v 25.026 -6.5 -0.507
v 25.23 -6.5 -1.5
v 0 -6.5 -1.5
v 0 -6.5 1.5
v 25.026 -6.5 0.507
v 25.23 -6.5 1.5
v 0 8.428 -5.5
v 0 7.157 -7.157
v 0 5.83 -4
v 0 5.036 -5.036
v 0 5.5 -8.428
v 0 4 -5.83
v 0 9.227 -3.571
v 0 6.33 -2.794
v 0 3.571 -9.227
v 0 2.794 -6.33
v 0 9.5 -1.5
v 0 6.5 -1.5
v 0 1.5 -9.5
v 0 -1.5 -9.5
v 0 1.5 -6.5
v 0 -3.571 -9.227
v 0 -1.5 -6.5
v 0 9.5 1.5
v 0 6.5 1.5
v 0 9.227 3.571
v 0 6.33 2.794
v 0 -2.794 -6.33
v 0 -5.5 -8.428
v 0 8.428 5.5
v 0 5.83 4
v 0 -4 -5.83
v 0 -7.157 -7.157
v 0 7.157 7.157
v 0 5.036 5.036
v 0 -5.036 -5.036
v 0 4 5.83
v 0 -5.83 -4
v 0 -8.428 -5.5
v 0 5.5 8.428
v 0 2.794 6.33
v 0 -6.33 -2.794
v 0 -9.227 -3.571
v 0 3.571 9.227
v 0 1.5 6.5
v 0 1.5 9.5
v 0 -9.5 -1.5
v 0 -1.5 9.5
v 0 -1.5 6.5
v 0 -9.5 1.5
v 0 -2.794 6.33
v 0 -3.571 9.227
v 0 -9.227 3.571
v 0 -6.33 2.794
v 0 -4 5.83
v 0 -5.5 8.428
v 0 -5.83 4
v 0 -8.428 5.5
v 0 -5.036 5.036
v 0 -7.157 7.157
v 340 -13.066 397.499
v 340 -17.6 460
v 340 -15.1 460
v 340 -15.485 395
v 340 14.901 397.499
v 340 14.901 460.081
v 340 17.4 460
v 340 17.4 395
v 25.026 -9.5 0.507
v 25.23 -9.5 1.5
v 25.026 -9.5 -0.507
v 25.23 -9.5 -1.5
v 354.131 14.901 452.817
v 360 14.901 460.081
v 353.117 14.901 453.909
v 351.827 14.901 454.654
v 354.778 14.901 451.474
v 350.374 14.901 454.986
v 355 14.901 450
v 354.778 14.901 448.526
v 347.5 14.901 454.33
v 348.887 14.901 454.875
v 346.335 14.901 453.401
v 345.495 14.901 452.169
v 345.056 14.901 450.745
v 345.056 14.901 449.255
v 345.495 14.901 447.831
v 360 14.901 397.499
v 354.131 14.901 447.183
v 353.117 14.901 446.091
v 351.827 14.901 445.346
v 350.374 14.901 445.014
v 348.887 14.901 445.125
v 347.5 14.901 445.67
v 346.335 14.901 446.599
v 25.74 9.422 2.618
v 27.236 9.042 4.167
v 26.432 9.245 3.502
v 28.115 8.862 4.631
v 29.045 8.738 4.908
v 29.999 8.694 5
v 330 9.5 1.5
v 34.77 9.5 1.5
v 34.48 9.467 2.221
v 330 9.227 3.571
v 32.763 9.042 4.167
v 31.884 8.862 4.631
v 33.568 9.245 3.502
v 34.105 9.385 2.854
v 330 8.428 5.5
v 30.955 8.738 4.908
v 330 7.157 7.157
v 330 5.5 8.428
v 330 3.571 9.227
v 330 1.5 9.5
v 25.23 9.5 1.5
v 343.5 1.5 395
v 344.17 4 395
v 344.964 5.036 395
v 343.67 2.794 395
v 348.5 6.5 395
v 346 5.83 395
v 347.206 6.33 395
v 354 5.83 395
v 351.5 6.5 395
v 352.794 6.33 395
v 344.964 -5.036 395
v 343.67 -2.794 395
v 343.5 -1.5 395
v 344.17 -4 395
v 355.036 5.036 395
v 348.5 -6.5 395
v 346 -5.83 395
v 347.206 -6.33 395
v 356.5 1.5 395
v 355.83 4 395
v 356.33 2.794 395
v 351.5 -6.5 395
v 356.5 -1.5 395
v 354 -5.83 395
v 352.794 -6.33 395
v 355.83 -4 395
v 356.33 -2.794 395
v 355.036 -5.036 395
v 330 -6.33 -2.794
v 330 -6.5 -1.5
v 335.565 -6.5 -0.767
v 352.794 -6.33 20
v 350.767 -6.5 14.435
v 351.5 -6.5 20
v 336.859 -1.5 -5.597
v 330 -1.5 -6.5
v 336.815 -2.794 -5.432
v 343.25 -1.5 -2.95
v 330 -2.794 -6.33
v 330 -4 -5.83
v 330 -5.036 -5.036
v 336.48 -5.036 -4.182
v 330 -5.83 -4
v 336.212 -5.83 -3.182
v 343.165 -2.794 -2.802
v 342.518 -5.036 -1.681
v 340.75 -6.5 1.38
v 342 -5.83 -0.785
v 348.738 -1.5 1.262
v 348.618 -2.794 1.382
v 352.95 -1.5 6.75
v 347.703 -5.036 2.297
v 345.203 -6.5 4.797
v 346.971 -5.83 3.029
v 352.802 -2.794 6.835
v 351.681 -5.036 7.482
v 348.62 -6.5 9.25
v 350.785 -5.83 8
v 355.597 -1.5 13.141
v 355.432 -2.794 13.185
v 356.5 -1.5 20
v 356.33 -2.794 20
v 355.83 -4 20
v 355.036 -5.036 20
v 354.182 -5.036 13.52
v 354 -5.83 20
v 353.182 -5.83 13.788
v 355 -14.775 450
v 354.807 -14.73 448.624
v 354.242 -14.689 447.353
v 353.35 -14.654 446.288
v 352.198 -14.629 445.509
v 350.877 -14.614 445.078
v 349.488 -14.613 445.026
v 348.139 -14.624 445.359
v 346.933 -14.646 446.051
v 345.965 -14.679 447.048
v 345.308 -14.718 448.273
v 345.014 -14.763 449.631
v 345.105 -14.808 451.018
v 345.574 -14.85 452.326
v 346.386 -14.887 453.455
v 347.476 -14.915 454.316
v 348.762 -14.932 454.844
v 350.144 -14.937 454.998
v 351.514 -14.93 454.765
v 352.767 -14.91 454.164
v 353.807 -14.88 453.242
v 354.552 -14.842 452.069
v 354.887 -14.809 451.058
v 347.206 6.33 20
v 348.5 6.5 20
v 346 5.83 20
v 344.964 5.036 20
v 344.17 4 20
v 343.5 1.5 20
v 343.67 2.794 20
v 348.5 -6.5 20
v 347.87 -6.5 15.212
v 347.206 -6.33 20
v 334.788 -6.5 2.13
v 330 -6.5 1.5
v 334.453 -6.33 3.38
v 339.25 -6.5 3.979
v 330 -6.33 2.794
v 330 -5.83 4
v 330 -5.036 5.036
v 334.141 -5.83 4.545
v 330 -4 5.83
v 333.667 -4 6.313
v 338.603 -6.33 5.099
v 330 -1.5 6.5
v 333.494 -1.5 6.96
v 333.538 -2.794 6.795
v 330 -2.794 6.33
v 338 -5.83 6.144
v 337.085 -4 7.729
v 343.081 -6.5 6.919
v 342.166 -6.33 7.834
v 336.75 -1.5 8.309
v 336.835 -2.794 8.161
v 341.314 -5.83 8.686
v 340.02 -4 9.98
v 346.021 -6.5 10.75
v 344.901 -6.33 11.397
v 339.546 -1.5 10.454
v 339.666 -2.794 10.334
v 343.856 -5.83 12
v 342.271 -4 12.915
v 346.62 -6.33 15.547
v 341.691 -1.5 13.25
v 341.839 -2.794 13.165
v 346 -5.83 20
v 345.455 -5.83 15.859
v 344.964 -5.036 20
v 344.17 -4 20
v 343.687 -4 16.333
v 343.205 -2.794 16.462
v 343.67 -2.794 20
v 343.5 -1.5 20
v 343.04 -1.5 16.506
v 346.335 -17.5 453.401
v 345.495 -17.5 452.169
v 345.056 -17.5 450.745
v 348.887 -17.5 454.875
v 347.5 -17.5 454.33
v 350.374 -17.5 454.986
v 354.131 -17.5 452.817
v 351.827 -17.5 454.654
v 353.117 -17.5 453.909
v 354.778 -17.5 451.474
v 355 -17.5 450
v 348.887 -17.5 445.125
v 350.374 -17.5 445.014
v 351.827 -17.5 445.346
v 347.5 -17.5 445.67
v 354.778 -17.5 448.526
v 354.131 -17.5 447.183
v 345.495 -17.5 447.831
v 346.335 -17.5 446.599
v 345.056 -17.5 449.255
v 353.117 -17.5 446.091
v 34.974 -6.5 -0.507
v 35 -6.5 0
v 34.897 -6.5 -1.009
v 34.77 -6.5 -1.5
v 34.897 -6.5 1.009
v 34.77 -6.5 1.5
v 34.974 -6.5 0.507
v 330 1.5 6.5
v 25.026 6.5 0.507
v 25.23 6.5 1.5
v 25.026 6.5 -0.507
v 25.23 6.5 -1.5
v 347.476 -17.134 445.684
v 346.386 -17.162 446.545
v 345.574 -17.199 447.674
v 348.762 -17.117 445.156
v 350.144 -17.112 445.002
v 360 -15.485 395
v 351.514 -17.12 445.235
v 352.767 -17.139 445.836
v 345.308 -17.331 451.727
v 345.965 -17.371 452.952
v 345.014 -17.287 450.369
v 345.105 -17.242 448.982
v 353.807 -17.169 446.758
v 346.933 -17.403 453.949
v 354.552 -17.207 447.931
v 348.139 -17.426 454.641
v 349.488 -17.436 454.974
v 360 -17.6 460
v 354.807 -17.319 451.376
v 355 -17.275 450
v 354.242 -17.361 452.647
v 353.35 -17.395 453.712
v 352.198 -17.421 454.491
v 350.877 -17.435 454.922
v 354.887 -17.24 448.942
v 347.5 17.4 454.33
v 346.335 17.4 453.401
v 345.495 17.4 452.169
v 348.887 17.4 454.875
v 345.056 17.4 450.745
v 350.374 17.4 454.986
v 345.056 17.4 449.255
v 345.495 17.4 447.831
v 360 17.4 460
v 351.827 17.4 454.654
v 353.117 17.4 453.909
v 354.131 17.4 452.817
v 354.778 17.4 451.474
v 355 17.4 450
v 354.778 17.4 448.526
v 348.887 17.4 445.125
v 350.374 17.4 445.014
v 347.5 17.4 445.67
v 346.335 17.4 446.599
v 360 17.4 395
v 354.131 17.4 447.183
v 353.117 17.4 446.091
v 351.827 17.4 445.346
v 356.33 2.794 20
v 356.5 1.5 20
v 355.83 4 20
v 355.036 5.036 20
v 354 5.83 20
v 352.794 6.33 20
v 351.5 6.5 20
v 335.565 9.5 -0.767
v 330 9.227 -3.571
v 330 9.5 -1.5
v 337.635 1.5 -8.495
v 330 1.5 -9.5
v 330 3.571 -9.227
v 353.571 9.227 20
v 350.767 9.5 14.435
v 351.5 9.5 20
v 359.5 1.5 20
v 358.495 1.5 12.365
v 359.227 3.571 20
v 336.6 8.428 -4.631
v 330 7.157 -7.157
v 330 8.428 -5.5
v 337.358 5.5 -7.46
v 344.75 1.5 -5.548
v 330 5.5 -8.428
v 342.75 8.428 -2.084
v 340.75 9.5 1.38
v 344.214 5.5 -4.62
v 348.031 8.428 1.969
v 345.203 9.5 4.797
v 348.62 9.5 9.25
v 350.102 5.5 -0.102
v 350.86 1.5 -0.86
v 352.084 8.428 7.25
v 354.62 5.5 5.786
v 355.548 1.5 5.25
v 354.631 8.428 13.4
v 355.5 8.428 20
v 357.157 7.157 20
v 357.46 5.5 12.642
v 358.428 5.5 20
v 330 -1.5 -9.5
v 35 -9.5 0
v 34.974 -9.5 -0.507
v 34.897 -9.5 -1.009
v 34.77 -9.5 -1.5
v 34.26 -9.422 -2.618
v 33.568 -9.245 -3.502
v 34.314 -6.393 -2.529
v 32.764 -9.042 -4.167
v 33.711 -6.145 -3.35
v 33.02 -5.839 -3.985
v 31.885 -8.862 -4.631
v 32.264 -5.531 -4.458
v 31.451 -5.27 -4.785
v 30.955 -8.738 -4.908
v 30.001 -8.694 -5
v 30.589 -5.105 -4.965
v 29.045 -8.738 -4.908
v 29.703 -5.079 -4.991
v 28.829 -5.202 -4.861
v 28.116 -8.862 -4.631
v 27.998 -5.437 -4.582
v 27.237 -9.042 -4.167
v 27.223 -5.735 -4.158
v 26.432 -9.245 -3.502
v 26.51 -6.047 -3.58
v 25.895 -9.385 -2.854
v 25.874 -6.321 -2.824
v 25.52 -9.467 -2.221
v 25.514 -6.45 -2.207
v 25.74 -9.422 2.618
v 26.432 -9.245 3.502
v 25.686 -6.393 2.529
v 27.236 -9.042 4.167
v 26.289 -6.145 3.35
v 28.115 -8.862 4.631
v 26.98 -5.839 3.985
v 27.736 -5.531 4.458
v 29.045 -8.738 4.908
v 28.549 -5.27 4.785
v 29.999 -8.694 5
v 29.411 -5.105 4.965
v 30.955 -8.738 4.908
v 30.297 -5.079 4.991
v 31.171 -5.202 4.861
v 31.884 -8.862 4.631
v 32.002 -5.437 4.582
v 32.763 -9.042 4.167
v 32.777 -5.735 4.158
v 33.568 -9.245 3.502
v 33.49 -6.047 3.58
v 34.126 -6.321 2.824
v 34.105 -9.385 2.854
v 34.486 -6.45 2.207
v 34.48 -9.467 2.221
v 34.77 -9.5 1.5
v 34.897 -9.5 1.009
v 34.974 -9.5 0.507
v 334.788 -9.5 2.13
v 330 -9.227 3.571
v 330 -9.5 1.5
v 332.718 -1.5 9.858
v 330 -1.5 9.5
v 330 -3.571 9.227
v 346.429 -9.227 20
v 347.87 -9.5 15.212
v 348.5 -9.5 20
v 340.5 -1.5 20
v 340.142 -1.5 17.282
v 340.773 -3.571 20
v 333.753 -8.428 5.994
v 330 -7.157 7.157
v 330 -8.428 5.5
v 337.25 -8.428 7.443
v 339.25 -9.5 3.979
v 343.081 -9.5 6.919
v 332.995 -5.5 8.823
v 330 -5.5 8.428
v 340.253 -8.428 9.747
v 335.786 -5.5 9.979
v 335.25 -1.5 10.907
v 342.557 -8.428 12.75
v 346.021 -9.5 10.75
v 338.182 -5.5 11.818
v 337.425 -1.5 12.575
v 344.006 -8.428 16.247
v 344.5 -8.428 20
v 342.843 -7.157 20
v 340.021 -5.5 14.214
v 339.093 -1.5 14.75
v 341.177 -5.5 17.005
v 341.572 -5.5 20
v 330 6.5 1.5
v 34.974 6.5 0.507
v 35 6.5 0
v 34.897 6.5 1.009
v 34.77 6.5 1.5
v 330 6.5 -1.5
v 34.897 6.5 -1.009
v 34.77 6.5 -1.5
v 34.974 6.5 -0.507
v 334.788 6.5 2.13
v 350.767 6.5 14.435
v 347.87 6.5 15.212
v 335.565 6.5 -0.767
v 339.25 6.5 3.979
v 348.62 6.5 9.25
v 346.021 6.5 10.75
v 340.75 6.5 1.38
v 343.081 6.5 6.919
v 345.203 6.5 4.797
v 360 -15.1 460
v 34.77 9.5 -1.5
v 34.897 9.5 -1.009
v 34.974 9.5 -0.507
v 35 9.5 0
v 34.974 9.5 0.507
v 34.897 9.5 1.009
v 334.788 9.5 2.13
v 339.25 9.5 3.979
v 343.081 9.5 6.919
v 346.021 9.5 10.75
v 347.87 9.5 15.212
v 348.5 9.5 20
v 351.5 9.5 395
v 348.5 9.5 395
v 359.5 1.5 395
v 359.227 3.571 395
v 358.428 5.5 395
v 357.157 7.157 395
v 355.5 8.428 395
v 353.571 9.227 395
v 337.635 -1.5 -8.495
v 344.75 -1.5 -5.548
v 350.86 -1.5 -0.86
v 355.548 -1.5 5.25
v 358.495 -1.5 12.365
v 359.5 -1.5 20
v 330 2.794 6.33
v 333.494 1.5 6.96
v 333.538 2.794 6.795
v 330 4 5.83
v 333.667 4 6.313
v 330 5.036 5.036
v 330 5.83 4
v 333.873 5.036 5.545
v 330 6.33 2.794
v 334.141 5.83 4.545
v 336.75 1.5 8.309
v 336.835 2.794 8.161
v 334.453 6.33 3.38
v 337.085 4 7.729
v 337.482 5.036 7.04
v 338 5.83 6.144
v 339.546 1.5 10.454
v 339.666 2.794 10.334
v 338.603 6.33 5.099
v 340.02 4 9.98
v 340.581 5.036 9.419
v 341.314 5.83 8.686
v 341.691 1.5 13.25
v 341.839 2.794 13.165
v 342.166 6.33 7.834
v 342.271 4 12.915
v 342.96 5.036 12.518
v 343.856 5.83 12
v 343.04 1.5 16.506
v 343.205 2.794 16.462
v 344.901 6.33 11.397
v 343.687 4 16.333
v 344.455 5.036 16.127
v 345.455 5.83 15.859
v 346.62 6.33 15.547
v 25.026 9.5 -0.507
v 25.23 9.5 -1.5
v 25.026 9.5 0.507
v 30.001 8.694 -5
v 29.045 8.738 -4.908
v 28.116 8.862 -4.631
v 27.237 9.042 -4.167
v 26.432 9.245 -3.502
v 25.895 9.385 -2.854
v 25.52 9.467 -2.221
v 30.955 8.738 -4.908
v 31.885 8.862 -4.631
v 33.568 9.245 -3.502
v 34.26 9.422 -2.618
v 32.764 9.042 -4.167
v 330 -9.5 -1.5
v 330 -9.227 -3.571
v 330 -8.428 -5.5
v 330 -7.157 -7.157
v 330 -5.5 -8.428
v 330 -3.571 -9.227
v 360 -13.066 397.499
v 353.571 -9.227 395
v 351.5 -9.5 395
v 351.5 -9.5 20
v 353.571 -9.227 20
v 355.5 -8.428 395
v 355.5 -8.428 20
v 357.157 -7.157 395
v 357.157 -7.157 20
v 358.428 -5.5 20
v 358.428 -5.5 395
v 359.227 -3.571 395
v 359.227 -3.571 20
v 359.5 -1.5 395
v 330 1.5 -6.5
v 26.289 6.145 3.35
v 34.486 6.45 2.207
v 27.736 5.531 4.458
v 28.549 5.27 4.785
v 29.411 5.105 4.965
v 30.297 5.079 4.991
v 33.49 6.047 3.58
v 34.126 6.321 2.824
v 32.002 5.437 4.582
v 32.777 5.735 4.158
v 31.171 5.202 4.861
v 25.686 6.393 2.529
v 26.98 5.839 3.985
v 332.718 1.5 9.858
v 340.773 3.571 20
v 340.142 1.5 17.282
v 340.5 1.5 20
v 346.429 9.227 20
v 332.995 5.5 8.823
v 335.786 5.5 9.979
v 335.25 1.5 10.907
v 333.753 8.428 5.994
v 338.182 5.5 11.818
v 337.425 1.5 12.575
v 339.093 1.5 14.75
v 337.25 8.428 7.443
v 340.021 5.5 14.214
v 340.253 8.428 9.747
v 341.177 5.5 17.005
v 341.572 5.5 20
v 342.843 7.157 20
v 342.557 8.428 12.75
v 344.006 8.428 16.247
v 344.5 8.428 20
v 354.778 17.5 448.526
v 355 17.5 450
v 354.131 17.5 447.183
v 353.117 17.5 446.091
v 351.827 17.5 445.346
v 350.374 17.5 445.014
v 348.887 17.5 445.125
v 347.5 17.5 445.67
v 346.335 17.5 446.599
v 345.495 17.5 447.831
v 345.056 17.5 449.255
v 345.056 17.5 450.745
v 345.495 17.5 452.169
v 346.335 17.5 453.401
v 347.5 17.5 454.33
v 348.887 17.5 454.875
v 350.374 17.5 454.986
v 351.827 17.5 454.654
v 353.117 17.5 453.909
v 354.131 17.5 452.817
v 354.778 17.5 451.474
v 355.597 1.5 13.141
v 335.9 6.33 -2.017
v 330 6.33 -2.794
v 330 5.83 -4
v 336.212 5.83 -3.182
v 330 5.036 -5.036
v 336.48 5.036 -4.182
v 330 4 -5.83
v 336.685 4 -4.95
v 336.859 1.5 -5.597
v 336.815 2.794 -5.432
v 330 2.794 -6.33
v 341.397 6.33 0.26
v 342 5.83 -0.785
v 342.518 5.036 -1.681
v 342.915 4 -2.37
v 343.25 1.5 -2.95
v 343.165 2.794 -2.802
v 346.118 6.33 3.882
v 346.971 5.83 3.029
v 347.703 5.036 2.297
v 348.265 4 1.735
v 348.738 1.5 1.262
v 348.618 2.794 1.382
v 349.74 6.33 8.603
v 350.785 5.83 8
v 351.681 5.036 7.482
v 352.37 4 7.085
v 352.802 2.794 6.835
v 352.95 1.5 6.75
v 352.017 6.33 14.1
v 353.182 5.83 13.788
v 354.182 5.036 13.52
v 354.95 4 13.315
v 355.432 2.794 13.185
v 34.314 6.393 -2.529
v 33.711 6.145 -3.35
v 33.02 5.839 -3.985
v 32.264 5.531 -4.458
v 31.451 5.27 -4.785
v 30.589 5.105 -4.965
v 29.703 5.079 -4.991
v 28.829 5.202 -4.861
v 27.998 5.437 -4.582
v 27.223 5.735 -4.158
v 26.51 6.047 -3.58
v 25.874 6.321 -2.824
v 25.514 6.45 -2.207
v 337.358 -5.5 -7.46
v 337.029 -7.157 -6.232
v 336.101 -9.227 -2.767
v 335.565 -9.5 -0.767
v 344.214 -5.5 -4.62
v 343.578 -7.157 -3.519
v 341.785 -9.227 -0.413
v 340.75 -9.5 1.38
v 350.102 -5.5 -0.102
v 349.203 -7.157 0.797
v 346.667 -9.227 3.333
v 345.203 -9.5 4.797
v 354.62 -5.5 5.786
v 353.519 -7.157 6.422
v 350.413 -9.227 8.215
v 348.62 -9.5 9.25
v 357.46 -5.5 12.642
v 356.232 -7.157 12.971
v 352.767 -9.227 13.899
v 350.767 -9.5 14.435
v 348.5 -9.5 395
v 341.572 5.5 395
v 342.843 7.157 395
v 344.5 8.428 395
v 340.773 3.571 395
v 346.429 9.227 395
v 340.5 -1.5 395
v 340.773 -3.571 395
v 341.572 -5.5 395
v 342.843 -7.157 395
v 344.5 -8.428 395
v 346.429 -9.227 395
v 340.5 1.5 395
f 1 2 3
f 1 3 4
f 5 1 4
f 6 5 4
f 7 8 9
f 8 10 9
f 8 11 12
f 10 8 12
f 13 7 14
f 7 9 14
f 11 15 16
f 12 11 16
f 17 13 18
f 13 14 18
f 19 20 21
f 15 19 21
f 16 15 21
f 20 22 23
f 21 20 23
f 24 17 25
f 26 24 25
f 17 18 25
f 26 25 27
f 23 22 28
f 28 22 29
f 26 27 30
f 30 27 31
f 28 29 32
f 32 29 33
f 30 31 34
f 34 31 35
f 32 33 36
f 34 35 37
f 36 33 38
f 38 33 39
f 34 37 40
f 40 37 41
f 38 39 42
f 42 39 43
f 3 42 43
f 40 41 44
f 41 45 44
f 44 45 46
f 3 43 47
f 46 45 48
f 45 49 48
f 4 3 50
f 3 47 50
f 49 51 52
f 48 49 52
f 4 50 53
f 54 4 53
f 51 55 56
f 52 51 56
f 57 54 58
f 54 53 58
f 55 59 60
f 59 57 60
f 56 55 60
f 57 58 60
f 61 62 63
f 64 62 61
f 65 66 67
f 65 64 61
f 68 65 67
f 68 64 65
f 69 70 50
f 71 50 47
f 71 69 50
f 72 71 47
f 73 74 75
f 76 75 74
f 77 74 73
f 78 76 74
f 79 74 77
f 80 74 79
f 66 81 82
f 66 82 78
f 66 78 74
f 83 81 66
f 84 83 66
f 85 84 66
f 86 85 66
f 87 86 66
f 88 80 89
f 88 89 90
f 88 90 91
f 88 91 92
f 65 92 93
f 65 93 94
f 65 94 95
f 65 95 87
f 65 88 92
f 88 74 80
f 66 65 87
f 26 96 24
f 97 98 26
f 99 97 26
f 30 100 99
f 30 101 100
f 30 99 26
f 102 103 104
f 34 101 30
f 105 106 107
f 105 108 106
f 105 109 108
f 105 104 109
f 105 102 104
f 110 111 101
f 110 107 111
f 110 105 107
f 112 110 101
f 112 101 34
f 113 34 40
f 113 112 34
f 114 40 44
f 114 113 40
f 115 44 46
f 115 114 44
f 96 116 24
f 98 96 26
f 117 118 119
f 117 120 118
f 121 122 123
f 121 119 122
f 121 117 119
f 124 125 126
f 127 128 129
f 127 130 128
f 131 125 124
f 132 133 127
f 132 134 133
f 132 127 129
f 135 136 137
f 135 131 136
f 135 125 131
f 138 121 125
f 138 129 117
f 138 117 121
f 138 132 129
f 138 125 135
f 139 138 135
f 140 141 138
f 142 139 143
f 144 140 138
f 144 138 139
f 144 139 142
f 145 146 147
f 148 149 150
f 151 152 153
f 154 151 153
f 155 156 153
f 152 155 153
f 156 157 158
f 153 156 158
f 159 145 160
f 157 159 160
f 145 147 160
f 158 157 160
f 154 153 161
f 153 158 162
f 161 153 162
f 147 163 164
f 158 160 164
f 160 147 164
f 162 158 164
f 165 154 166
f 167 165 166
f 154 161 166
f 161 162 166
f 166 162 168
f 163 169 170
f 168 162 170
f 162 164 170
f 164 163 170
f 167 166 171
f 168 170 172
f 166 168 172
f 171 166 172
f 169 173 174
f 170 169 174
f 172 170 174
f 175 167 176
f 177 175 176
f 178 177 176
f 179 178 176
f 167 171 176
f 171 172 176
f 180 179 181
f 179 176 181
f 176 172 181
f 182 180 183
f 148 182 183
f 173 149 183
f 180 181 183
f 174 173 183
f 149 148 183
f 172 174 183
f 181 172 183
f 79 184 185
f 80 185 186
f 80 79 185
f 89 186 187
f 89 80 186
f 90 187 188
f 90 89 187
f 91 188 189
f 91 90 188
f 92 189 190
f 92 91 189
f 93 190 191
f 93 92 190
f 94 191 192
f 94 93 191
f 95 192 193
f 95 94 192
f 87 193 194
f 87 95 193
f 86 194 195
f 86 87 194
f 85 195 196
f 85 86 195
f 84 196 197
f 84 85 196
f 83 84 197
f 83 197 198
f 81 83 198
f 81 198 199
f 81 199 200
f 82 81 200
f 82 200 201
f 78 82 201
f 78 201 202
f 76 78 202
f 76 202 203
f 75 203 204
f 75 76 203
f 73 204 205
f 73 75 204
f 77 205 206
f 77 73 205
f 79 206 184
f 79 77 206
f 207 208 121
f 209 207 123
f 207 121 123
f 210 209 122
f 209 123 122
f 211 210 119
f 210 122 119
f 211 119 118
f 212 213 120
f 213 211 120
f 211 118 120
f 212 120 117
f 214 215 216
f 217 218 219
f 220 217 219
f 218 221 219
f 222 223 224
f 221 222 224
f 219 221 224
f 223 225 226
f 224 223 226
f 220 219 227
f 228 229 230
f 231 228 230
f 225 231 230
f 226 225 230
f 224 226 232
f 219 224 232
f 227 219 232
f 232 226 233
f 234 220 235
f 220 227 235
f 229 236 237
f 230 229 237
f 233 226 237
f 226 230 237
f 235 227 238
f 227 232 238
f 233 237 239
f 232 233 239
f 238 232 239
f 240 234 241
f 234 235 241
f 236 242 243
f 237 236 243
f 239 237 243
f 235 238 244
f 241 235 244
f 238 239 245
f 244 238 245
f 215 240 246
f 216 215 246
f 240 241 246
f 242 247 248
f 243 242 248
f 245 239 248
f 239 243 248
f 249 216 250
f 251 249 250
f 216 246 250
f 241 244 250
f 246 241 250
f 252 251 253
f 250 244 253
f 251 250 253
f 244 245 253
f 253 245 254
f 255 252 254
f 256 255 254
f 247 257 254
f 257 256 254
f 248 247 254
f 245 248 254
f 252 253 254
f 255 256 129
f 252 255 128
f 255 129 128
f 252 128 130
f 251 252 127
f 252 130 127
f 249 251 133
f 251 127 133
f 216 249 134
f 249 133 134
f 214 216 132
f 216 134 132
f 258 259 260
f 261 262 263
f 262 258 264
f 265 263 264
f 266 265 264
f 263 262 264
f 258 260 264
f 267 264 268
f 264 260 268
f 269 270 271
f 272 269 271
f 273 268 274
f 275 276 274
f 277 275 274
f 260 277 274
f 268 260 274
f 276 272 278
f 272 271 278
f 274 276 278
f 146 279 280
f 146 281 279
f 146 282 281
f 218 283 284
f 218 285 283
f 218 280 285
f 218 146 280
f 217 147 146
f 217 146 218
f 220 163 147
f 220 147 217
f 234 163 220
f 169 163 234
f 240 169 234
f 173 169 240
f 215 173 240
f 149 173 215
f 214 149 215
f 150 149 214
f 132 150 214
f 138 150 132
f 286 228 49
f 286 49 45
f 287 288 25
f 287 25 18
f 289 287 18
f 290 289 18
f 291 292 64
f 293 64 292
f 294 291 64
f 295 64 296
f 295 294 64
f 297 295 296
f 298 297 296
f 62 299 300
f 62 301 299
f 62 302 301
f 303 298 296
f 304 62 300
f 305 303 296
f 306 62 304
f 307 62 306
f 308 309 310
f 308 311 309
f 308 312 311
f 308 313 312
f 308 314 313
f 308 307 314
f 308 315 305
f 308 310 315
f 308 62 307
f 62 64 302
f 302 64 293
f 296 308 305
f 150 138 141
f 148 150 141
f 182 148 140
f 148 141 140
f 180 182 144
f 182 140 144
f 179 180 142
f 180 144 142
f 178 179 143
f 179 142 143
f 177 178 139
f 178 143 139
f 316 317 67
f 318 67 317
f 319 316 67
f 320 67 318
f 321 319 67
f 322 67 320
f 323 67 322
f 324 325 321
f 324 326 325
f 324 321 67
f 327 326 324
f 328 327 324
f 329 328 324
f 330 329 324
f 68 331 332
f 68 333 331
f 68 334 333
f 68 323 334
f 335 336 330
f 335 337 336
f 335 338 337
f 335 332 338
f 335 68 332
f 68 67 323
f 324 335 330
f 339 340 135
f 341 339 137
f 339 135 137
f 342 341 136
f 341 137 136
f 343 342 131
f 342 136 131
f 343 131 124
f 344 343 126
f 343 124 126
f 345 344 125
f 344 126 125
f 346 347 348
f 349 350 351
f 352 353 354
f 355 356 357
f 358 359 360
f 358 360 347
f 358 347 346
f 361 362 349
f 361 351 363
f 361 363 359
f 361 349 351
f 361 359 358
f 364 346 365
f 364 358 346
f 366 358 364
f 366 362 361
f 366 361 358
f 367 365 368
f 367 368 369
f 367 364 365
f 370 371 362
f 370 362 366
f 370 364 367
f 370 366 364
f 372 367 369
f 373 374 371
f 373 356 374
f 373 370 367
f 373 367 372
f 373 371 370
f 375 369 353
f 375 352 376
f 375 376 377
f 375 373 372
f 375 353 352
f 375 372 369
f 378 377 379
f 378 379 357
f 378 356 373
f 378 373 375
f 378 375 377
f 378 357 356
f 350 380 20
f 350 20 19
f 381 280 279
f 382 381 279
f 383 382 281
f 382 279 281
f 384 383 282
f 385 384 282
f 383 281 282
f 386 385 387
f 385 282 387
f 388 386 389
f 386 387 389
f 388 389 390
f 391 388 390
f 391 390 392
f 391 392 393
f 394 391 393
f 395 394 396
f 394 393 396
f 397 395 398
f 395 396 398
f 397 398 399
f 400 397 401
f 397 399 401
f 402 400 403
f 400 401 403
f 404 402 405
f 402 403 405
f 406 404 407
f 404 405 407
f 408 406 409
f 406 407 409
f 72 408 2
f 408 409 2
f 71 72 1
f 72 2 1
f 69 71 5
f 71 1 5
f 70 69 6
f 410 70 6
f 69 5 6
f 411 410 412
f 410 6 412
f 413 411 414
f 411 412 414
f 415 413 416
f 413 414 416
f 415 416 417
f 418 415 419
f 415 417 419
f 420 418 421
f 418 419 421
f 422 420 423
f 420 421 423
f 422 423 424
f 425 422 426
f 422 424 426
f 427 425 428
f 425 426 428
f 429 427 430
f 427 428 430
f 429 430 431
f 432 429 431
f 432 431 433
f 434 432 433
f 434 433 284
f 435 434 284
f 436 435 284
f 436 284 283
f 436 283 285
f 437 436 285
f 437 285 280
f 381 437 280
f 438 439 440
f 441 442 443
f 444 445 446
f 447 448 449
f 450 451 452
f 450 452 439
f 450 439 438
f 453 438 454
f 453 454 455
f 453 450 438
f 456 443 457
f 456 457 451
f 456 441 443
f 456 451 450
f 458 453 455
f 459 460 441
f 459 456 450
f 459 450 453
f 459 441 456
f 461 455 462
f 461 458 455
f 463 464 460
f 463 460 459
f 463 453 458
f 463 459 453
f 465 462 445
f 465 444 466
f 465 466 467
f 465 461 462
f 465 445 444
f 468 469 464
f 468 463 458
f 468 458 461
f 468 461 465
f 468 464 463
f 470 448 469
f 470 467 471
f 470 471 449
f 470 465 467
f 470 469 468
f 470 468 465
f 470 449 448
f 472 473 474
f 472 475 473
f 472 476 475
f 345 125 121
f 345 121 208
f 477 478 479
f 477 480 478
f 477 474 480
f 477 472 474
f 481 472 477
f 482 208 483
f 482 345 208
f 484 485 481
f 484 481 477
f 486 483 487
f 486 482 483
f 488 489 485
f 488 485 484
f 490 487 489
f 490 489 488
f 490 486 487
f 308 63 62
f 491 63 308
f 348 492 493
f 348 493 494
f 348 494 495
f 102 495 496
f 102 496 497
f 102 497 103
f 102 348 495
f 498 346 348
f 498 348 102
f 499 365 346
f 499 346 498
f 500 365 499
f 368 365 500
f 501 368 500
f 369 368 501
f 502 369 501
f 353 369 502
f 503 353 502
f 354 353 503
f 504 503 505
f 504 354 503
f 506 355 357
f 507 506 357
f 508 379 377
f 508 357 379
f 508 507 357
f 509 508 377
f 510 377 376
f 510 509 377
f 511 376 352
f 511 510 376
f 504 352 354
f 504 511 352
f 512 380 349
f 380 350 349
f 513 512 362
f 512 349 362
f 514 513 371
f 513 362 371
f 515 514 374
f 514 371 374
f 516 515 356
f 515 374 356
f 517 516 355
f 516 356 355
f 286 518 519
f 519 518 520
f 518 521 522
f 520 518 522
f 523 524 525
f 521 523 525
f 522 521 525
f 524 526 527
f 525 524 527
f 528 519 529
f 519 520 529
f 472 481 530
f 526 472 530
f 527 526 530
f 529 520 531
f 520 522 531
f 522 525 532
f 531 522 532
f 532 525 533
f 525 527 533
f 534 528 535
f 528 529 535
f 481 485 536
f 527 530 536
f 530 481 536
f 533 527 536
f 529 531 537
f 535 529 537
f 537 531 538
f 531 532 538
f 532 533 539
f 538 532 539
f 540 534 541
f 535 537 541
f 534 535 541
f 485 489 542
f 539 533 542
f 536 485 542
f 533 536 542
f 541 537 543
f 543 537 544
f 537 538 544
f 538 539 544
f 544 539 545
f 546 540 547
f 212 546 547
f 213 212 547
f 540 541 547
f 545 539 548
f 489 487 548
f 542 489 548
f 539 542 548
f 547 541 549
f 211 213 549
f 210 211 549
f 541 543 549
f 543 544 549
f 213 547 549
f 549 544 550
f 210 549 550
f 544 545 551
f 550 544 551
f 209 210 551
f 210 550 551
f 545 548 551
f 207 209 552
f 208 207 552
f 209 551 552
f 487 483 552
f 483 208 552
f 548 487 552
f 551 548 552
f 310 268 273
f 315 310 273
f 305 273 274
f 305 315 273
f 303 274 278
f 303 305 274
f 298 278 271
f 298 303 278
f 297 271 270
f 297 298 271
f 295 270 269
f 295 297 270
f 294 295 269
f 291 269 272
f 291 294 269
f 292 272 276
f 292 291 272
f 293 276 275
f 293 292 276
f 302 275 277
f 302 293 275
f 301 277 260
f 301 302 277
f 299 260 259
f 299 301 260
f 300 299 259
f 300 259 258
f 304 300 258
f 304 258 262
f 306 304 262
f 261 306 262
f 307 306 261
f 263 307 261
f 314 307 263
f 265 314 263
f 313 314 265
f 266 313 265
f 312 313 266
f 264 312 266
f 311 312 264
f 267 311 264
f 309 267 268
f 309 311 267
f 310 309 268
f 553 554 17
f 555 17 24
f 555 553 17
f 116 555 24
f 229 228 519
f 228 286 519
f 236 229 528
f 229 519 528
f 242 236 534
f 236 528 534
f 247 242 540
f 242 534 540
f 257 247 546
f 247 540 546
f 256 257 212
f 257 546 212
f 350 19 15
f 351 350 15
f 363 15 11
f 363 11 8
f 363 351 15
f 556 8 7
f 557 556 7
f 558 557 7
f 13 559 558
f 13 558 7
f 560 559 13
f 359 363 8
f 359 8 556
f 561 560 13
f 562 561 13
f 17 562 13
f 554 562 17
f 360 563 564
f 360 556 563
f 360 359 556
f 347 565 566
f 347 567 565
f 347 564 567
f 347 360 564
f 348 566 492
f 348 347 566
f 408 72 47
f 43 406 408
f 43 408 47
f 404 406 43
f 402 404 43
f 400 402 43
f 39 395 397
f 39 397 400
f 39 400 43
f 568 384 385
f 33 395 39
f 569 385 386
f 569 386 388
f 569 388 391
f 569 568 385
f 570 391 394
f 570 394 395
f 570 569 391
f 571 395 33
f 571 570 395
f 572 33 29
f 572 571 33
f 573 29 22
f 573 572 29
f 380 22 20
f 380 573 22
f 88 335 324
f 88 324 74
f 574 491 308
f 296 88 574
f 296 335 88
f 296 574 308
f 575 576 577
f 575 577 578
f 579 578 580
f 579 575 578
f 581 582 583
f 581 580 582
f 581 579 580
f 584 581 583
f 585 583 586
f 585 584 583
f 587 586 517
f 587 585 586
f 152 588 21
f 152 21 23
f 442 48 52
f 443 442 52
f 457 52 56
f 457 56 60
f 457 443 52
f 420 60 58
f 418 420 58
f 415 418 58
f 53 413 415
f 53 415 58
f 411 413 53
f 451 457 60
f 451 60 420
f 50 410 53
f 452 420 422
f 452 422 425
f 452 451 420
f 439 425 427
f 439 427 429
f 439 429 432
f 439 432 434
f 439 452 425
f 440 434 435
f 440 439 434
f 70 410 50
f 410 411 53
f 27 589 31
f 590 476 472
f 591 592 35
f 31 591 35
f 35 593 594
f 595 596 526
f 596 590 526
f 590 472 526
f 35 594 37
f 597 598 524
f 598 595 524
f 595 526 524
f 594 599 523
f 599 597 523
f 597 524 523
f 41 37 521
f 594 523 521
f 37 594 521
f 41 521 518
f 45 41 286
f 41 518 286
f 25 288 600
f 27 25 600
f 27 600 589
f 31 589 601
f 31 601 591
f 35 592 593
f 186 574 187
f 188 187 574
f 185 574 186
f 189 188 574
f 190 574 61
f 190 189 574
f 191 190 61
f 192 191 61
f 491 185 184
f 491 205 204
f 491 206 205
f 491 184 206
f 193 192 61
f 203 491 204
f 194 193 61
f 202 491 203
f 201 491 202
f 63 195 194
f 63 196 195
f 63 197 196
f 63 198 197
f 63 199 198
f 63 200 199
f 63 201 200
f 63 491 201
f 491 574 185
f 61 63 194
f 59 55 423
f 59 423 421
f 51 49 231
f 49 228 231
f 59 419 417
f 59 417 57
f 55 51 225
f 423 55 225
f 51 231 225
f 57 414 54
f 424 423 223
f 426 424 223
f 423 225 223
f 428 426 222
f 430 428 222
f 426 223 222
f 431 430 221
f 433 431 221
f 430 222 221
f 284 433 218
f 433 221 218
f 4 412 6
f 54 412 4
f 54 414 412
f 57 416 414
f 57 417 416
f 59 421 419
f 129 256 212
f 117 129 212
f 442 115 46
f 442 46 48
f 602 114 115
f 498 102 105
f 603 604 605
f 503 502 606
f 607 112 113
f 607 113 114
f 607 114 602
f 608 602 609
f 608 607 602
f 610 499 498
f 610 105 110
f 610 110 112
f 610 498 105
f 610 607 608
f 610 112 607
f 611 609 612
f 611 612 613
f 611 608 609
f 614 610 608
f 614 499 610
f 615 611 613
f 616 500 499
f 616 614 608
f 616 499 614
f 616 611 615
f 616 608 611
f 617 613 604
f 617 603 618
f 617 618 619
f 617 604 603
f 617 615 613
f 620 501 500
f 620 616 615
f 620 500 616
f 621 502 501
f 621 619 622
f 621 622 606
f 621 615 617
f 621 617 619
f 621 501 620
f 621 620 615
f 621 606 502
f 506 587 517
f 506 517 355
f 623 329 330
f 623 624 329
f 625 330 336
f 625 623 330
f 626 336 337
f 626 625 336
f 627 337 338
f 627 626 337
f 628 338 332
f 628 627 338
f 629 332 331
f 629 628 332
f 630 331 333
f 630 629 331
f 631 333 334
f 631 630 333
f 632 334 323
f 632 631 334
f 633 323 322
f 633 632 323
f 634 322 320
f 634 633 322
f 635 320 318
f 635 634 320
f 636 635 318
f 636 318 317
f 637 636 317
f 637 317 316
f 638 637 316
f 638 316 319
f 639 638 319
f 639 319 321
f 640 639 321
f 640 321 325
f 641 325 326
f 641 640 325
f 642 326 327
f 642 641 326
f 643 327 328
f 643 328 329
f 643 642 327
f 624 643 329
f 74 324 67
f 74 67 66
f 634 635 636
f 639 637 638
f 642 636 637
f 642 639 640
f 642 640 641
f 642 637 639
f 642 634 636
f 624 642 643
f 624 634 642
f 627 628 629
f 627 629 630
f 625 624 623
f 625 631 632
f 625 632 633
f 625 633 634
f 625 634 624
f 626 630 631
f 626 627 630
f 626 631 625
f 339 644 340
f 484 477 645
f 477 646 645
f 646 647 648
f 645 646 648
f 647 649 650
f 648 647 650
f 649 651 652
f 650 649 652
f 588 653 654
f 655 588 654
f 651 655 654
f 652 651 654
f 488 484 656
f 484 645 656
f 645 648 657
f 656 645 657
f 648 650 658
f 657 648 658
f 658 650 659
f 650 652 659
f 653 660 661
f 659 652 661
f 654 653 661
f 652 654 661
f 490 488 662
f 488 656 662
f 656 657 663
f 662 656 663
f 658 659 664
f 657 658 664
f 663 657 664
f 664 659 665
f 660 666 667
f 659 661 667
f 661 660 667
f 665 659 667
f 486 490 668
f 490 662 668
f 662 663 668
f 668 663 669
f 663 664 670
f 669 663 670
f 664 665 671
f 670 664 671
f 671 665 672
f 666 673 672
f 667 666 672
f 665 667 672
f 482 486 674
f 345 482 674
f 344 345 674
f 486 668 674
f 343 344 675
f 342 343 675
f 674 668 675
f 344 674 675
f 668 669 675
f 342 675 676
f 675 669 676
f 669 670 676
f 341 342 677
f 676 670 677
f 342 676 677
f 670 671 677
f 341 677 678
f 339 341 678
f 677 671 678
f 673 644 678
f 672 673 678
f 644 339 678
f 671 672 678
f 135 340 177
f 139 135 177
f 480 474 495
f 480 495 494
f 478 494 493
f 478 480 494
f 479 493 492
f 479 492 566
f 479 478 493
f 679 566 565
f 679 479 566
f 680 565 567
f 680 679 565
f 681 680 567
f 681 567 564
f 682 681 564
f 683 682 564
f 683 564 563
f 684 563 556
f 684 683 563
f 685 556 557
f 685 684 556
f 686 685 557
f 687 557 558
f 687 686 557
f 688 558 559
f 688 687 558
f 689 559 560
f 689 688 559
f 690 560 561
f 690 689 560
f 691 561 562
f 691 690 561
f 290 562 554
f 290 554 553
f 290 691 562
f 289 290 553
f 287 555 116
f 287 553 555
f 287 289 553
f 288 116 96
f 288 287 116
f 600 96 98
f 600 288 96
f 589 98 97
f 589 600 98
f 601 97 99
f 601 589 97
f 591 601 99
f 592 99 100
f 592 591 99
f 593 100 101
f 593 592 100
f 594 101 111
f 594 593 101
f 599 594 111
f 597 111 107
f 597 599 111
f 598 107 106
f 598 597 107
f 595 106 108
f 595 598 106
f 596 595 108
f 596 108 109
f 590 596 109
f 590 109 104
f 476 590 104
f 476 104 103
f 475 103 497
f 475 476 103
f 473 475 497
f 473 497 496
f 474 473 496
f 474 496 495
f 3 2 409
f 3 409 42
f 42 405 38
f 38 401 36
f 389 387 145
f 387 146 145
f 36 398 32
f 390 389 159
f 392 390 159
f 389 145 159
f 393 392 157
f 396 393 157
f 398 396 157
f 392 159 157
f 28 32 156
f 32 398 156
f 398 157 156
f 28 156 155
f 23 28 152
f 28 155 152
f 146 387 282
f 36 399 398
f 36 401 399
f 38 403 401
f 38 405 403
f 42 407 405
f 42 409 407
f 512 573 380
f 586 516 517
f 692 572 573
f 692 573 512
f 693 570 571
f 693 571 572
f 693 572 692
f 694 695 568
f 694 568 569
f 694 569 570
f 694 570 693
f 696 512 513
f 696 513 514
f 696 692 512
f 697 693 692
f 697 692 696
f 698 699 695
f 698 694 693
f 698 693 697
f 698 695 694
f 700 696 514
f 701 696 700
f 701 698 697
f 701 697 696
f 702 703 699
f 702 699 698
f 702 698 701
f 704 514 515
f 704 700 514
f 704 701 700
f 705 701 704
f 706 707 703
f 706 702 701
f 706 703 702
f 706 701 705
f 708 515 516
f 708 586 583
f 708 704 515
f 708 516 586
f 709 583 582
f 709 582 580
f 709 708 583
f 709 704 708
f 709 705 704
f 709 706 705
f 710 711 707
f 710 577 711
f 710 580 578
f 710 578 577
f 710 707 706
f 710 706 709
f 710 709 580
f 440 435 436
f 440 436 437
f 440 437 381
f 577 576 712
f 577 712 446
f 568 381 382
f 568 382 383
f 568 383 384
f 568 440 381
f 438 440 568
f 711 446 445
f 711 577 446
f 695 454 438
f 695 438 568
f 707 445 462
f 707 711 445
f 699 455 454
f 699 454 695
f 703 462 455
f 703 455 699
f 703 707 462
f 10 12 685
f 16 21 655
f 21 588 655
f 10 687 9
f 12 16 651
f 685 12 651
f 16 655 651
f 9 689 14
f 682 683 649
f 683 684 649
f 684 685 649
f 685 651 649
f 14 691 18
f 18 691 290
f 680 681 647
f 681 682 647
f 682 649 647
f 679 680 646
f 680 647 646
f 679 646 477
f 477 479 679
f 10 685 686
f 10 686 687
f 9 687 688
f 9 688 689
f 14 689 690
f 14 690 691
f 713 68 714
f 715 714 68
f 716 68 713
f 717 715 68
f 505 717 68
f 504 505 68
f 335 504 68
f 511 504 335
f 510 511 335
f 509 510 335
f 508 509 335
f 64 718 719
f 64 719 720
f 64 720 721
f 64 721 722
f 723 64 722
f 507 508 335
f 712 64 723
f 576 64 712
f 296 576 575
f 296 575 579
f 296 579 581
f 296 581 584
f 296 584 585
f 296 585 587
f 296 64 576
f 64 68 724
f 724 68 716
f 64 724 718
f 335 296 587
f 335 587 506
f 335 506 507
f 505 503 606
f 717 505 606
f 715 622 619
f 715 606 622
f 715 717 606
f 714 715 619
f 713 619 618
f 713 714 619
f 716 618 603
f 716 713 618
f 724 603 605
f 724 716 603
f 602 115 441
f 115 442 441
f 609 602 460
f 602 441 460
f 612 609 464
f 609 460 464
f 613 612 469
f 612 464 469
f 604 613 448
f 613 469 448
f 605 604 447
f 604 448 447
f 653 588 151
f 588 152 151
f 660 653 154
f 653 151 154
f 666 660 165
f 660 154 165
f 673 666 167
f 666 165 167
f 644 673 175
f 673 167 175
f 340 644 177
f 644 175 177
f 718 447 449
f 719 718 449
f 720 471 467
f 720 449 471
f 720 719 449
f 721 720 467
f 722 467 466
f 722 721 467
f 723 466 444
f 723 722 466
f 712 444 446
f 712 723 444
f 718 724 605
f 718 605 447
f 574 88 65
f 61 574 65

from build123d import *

# Parameters (mm, degrees)
SKETCH4_R                = 5
BOSS_EXTRUDE2_DEPTH      = 17.5
BOSS_EXTRUDE2_DEPTH_BACK = 17.5
SKETCH7_W                = 20
SKETCH7_H                = 2.5
SKETCH8_R                = 5
CUT_EXTRUDE1_DEPTH       = 18.5
CUT_EXTRUDE1_DEPTH_BACK  = 18.6


with BuildPart() as part:
    # Sweep-Thin1: sweep along a path in Sketch1
    with BuildLine(Plane(origin=(0, 0, 0), x_dir=(1, 0, 0), z_dir=(0, 1, 0))) as sweep_thin1_path:
        Line((0, 0), (330, 0))
        ThreePointArc((330, 0), (344.142135624, -5.857864376), (350, -20))
        Line((350, -20), (350, -395))
    # Sketch2 → Sweep-Thin1 (sweep)
    with BuildSketch(Plane(origin=(0, 0, 0), x_dir=(0, 0, -1), z_dir=(1, 0, 0))):
        with BuildLine():
            Line((1.5, 9.5), (-1.5, 9.5))
            ThreePointArc((-1.5, 9.5), (-7.156854249, 7.156854249), (-9.5, 1.5))
            Line((-9.5, 1.5), (-9.5, -1.5))
            ThreePointArc((-9.5, -1.5), (-7.156854249, -7.156854249), (-1.5, -9.5))
            Line((-1.5, -9.5), (1.5, -9.5))
            ThreePointArc((1.5, -9.5), (7.156854249, -7.156854249), (9.5, -1.5))
            Line((9.5, -1.5), (9.5, 1.5))
            ThreePointArc((9.5, 1.5), (7.156854249, 7.156854249), (1.5, 9.5))
        make_face()
        with BuildLine():
            Line((1.5, 6.5), (-1.5, 6.5))
            ThreePointArc((-1.5, 6.5), (-5.035533906, 5.035533906), (-6.5, 1.5))
            Line((-6.5, 1.5), (-6.5, -1.5))
            ThreePointArc((-6.5, -1.5), (-5.035533906, -5.035533906), (-1.5, -6.5))
            Line((-1.5, -6.5), (1.5, -6.5))
            ThreePointArc((1.5, -6.5), (5.035533906, -5.035533906), (6.5, -1.5))
            Line((6.5, -1.5), (6.5, 1.5))
            ThreePointArc((6.5, 1.5), (5.035533906, 5.035533906), (1.5, 6.5))
        make_face(mode=Mode.SUBTRACT)
    sweep(path=sweep_thin1_path.line)



with BuildPart() as body_2:
    # Sketch4 → Boss-Extrude2 (new body, two sides)
    with BuildSketch(Plane(origin=(0, 0, 0), x_dir=(1, 0, 0), z_dir=(0, 1, 0))) as boss_extrude2_sk:
        with Locations((350, -450)):
            Circle(SKETCH4_R)
    extrude(amount=BOSS_EXTRUDE2_DEPTH)
    extrude(boss_extrude2_sk.sketch, amount=-BOSS_EXTRUDE2_DEPTH_BACK)


with BuildPart() as part_1:
    add(part.part)

    add(body_2.part)  # Sweep1 merges body 2
    # Sweep1: sweep along a path in Sketch6
    with BuildLine(Plane(origin=(350, 0, 0), x_dir=(0, 0, -1), z_dir=(1, 0, 0))) as sweep1_path:
        Line((-460, 17.4), (-395, 17.4))
        Line((-395, 17.4), (-395, 0))
        Line((-395, 0), (-395, -15.485164569))
        Line((-395, -15.485164569), (-460, -17.6))
    # Sketch7 → Sweep1 (sweep)
    with BuildSketch(Plane.XY.offset(460)):
        with Locations((350, -16.35)):
            Rectangle(SKETCH7_W, SKETCH7_H)
    sweep(path=sweep1_path.line, transition=Transition.RIGHT)

    # Sketch8 → Cut-Extrude1 (cut, two sides)
    with BuildSketch(Plane(origin=(0, 0, 0), x_dir=(1, 0, 0), z_dir=(0, 1, 0))) as cut_extrude1_sk:
        with Locations((30, 0)):
            Circle(SKETCH8_R)
    extrude(amount=CUT_EXTRUDE1_DEPTH, mode=Mode.SUBTRACT)
    extrude(cut_extrude1_sk.sketch, amount=-CUT_EXTRUDE1_DEPTH_BACK, mode=Mode.SUBTRACT)


solid = part_1.part
